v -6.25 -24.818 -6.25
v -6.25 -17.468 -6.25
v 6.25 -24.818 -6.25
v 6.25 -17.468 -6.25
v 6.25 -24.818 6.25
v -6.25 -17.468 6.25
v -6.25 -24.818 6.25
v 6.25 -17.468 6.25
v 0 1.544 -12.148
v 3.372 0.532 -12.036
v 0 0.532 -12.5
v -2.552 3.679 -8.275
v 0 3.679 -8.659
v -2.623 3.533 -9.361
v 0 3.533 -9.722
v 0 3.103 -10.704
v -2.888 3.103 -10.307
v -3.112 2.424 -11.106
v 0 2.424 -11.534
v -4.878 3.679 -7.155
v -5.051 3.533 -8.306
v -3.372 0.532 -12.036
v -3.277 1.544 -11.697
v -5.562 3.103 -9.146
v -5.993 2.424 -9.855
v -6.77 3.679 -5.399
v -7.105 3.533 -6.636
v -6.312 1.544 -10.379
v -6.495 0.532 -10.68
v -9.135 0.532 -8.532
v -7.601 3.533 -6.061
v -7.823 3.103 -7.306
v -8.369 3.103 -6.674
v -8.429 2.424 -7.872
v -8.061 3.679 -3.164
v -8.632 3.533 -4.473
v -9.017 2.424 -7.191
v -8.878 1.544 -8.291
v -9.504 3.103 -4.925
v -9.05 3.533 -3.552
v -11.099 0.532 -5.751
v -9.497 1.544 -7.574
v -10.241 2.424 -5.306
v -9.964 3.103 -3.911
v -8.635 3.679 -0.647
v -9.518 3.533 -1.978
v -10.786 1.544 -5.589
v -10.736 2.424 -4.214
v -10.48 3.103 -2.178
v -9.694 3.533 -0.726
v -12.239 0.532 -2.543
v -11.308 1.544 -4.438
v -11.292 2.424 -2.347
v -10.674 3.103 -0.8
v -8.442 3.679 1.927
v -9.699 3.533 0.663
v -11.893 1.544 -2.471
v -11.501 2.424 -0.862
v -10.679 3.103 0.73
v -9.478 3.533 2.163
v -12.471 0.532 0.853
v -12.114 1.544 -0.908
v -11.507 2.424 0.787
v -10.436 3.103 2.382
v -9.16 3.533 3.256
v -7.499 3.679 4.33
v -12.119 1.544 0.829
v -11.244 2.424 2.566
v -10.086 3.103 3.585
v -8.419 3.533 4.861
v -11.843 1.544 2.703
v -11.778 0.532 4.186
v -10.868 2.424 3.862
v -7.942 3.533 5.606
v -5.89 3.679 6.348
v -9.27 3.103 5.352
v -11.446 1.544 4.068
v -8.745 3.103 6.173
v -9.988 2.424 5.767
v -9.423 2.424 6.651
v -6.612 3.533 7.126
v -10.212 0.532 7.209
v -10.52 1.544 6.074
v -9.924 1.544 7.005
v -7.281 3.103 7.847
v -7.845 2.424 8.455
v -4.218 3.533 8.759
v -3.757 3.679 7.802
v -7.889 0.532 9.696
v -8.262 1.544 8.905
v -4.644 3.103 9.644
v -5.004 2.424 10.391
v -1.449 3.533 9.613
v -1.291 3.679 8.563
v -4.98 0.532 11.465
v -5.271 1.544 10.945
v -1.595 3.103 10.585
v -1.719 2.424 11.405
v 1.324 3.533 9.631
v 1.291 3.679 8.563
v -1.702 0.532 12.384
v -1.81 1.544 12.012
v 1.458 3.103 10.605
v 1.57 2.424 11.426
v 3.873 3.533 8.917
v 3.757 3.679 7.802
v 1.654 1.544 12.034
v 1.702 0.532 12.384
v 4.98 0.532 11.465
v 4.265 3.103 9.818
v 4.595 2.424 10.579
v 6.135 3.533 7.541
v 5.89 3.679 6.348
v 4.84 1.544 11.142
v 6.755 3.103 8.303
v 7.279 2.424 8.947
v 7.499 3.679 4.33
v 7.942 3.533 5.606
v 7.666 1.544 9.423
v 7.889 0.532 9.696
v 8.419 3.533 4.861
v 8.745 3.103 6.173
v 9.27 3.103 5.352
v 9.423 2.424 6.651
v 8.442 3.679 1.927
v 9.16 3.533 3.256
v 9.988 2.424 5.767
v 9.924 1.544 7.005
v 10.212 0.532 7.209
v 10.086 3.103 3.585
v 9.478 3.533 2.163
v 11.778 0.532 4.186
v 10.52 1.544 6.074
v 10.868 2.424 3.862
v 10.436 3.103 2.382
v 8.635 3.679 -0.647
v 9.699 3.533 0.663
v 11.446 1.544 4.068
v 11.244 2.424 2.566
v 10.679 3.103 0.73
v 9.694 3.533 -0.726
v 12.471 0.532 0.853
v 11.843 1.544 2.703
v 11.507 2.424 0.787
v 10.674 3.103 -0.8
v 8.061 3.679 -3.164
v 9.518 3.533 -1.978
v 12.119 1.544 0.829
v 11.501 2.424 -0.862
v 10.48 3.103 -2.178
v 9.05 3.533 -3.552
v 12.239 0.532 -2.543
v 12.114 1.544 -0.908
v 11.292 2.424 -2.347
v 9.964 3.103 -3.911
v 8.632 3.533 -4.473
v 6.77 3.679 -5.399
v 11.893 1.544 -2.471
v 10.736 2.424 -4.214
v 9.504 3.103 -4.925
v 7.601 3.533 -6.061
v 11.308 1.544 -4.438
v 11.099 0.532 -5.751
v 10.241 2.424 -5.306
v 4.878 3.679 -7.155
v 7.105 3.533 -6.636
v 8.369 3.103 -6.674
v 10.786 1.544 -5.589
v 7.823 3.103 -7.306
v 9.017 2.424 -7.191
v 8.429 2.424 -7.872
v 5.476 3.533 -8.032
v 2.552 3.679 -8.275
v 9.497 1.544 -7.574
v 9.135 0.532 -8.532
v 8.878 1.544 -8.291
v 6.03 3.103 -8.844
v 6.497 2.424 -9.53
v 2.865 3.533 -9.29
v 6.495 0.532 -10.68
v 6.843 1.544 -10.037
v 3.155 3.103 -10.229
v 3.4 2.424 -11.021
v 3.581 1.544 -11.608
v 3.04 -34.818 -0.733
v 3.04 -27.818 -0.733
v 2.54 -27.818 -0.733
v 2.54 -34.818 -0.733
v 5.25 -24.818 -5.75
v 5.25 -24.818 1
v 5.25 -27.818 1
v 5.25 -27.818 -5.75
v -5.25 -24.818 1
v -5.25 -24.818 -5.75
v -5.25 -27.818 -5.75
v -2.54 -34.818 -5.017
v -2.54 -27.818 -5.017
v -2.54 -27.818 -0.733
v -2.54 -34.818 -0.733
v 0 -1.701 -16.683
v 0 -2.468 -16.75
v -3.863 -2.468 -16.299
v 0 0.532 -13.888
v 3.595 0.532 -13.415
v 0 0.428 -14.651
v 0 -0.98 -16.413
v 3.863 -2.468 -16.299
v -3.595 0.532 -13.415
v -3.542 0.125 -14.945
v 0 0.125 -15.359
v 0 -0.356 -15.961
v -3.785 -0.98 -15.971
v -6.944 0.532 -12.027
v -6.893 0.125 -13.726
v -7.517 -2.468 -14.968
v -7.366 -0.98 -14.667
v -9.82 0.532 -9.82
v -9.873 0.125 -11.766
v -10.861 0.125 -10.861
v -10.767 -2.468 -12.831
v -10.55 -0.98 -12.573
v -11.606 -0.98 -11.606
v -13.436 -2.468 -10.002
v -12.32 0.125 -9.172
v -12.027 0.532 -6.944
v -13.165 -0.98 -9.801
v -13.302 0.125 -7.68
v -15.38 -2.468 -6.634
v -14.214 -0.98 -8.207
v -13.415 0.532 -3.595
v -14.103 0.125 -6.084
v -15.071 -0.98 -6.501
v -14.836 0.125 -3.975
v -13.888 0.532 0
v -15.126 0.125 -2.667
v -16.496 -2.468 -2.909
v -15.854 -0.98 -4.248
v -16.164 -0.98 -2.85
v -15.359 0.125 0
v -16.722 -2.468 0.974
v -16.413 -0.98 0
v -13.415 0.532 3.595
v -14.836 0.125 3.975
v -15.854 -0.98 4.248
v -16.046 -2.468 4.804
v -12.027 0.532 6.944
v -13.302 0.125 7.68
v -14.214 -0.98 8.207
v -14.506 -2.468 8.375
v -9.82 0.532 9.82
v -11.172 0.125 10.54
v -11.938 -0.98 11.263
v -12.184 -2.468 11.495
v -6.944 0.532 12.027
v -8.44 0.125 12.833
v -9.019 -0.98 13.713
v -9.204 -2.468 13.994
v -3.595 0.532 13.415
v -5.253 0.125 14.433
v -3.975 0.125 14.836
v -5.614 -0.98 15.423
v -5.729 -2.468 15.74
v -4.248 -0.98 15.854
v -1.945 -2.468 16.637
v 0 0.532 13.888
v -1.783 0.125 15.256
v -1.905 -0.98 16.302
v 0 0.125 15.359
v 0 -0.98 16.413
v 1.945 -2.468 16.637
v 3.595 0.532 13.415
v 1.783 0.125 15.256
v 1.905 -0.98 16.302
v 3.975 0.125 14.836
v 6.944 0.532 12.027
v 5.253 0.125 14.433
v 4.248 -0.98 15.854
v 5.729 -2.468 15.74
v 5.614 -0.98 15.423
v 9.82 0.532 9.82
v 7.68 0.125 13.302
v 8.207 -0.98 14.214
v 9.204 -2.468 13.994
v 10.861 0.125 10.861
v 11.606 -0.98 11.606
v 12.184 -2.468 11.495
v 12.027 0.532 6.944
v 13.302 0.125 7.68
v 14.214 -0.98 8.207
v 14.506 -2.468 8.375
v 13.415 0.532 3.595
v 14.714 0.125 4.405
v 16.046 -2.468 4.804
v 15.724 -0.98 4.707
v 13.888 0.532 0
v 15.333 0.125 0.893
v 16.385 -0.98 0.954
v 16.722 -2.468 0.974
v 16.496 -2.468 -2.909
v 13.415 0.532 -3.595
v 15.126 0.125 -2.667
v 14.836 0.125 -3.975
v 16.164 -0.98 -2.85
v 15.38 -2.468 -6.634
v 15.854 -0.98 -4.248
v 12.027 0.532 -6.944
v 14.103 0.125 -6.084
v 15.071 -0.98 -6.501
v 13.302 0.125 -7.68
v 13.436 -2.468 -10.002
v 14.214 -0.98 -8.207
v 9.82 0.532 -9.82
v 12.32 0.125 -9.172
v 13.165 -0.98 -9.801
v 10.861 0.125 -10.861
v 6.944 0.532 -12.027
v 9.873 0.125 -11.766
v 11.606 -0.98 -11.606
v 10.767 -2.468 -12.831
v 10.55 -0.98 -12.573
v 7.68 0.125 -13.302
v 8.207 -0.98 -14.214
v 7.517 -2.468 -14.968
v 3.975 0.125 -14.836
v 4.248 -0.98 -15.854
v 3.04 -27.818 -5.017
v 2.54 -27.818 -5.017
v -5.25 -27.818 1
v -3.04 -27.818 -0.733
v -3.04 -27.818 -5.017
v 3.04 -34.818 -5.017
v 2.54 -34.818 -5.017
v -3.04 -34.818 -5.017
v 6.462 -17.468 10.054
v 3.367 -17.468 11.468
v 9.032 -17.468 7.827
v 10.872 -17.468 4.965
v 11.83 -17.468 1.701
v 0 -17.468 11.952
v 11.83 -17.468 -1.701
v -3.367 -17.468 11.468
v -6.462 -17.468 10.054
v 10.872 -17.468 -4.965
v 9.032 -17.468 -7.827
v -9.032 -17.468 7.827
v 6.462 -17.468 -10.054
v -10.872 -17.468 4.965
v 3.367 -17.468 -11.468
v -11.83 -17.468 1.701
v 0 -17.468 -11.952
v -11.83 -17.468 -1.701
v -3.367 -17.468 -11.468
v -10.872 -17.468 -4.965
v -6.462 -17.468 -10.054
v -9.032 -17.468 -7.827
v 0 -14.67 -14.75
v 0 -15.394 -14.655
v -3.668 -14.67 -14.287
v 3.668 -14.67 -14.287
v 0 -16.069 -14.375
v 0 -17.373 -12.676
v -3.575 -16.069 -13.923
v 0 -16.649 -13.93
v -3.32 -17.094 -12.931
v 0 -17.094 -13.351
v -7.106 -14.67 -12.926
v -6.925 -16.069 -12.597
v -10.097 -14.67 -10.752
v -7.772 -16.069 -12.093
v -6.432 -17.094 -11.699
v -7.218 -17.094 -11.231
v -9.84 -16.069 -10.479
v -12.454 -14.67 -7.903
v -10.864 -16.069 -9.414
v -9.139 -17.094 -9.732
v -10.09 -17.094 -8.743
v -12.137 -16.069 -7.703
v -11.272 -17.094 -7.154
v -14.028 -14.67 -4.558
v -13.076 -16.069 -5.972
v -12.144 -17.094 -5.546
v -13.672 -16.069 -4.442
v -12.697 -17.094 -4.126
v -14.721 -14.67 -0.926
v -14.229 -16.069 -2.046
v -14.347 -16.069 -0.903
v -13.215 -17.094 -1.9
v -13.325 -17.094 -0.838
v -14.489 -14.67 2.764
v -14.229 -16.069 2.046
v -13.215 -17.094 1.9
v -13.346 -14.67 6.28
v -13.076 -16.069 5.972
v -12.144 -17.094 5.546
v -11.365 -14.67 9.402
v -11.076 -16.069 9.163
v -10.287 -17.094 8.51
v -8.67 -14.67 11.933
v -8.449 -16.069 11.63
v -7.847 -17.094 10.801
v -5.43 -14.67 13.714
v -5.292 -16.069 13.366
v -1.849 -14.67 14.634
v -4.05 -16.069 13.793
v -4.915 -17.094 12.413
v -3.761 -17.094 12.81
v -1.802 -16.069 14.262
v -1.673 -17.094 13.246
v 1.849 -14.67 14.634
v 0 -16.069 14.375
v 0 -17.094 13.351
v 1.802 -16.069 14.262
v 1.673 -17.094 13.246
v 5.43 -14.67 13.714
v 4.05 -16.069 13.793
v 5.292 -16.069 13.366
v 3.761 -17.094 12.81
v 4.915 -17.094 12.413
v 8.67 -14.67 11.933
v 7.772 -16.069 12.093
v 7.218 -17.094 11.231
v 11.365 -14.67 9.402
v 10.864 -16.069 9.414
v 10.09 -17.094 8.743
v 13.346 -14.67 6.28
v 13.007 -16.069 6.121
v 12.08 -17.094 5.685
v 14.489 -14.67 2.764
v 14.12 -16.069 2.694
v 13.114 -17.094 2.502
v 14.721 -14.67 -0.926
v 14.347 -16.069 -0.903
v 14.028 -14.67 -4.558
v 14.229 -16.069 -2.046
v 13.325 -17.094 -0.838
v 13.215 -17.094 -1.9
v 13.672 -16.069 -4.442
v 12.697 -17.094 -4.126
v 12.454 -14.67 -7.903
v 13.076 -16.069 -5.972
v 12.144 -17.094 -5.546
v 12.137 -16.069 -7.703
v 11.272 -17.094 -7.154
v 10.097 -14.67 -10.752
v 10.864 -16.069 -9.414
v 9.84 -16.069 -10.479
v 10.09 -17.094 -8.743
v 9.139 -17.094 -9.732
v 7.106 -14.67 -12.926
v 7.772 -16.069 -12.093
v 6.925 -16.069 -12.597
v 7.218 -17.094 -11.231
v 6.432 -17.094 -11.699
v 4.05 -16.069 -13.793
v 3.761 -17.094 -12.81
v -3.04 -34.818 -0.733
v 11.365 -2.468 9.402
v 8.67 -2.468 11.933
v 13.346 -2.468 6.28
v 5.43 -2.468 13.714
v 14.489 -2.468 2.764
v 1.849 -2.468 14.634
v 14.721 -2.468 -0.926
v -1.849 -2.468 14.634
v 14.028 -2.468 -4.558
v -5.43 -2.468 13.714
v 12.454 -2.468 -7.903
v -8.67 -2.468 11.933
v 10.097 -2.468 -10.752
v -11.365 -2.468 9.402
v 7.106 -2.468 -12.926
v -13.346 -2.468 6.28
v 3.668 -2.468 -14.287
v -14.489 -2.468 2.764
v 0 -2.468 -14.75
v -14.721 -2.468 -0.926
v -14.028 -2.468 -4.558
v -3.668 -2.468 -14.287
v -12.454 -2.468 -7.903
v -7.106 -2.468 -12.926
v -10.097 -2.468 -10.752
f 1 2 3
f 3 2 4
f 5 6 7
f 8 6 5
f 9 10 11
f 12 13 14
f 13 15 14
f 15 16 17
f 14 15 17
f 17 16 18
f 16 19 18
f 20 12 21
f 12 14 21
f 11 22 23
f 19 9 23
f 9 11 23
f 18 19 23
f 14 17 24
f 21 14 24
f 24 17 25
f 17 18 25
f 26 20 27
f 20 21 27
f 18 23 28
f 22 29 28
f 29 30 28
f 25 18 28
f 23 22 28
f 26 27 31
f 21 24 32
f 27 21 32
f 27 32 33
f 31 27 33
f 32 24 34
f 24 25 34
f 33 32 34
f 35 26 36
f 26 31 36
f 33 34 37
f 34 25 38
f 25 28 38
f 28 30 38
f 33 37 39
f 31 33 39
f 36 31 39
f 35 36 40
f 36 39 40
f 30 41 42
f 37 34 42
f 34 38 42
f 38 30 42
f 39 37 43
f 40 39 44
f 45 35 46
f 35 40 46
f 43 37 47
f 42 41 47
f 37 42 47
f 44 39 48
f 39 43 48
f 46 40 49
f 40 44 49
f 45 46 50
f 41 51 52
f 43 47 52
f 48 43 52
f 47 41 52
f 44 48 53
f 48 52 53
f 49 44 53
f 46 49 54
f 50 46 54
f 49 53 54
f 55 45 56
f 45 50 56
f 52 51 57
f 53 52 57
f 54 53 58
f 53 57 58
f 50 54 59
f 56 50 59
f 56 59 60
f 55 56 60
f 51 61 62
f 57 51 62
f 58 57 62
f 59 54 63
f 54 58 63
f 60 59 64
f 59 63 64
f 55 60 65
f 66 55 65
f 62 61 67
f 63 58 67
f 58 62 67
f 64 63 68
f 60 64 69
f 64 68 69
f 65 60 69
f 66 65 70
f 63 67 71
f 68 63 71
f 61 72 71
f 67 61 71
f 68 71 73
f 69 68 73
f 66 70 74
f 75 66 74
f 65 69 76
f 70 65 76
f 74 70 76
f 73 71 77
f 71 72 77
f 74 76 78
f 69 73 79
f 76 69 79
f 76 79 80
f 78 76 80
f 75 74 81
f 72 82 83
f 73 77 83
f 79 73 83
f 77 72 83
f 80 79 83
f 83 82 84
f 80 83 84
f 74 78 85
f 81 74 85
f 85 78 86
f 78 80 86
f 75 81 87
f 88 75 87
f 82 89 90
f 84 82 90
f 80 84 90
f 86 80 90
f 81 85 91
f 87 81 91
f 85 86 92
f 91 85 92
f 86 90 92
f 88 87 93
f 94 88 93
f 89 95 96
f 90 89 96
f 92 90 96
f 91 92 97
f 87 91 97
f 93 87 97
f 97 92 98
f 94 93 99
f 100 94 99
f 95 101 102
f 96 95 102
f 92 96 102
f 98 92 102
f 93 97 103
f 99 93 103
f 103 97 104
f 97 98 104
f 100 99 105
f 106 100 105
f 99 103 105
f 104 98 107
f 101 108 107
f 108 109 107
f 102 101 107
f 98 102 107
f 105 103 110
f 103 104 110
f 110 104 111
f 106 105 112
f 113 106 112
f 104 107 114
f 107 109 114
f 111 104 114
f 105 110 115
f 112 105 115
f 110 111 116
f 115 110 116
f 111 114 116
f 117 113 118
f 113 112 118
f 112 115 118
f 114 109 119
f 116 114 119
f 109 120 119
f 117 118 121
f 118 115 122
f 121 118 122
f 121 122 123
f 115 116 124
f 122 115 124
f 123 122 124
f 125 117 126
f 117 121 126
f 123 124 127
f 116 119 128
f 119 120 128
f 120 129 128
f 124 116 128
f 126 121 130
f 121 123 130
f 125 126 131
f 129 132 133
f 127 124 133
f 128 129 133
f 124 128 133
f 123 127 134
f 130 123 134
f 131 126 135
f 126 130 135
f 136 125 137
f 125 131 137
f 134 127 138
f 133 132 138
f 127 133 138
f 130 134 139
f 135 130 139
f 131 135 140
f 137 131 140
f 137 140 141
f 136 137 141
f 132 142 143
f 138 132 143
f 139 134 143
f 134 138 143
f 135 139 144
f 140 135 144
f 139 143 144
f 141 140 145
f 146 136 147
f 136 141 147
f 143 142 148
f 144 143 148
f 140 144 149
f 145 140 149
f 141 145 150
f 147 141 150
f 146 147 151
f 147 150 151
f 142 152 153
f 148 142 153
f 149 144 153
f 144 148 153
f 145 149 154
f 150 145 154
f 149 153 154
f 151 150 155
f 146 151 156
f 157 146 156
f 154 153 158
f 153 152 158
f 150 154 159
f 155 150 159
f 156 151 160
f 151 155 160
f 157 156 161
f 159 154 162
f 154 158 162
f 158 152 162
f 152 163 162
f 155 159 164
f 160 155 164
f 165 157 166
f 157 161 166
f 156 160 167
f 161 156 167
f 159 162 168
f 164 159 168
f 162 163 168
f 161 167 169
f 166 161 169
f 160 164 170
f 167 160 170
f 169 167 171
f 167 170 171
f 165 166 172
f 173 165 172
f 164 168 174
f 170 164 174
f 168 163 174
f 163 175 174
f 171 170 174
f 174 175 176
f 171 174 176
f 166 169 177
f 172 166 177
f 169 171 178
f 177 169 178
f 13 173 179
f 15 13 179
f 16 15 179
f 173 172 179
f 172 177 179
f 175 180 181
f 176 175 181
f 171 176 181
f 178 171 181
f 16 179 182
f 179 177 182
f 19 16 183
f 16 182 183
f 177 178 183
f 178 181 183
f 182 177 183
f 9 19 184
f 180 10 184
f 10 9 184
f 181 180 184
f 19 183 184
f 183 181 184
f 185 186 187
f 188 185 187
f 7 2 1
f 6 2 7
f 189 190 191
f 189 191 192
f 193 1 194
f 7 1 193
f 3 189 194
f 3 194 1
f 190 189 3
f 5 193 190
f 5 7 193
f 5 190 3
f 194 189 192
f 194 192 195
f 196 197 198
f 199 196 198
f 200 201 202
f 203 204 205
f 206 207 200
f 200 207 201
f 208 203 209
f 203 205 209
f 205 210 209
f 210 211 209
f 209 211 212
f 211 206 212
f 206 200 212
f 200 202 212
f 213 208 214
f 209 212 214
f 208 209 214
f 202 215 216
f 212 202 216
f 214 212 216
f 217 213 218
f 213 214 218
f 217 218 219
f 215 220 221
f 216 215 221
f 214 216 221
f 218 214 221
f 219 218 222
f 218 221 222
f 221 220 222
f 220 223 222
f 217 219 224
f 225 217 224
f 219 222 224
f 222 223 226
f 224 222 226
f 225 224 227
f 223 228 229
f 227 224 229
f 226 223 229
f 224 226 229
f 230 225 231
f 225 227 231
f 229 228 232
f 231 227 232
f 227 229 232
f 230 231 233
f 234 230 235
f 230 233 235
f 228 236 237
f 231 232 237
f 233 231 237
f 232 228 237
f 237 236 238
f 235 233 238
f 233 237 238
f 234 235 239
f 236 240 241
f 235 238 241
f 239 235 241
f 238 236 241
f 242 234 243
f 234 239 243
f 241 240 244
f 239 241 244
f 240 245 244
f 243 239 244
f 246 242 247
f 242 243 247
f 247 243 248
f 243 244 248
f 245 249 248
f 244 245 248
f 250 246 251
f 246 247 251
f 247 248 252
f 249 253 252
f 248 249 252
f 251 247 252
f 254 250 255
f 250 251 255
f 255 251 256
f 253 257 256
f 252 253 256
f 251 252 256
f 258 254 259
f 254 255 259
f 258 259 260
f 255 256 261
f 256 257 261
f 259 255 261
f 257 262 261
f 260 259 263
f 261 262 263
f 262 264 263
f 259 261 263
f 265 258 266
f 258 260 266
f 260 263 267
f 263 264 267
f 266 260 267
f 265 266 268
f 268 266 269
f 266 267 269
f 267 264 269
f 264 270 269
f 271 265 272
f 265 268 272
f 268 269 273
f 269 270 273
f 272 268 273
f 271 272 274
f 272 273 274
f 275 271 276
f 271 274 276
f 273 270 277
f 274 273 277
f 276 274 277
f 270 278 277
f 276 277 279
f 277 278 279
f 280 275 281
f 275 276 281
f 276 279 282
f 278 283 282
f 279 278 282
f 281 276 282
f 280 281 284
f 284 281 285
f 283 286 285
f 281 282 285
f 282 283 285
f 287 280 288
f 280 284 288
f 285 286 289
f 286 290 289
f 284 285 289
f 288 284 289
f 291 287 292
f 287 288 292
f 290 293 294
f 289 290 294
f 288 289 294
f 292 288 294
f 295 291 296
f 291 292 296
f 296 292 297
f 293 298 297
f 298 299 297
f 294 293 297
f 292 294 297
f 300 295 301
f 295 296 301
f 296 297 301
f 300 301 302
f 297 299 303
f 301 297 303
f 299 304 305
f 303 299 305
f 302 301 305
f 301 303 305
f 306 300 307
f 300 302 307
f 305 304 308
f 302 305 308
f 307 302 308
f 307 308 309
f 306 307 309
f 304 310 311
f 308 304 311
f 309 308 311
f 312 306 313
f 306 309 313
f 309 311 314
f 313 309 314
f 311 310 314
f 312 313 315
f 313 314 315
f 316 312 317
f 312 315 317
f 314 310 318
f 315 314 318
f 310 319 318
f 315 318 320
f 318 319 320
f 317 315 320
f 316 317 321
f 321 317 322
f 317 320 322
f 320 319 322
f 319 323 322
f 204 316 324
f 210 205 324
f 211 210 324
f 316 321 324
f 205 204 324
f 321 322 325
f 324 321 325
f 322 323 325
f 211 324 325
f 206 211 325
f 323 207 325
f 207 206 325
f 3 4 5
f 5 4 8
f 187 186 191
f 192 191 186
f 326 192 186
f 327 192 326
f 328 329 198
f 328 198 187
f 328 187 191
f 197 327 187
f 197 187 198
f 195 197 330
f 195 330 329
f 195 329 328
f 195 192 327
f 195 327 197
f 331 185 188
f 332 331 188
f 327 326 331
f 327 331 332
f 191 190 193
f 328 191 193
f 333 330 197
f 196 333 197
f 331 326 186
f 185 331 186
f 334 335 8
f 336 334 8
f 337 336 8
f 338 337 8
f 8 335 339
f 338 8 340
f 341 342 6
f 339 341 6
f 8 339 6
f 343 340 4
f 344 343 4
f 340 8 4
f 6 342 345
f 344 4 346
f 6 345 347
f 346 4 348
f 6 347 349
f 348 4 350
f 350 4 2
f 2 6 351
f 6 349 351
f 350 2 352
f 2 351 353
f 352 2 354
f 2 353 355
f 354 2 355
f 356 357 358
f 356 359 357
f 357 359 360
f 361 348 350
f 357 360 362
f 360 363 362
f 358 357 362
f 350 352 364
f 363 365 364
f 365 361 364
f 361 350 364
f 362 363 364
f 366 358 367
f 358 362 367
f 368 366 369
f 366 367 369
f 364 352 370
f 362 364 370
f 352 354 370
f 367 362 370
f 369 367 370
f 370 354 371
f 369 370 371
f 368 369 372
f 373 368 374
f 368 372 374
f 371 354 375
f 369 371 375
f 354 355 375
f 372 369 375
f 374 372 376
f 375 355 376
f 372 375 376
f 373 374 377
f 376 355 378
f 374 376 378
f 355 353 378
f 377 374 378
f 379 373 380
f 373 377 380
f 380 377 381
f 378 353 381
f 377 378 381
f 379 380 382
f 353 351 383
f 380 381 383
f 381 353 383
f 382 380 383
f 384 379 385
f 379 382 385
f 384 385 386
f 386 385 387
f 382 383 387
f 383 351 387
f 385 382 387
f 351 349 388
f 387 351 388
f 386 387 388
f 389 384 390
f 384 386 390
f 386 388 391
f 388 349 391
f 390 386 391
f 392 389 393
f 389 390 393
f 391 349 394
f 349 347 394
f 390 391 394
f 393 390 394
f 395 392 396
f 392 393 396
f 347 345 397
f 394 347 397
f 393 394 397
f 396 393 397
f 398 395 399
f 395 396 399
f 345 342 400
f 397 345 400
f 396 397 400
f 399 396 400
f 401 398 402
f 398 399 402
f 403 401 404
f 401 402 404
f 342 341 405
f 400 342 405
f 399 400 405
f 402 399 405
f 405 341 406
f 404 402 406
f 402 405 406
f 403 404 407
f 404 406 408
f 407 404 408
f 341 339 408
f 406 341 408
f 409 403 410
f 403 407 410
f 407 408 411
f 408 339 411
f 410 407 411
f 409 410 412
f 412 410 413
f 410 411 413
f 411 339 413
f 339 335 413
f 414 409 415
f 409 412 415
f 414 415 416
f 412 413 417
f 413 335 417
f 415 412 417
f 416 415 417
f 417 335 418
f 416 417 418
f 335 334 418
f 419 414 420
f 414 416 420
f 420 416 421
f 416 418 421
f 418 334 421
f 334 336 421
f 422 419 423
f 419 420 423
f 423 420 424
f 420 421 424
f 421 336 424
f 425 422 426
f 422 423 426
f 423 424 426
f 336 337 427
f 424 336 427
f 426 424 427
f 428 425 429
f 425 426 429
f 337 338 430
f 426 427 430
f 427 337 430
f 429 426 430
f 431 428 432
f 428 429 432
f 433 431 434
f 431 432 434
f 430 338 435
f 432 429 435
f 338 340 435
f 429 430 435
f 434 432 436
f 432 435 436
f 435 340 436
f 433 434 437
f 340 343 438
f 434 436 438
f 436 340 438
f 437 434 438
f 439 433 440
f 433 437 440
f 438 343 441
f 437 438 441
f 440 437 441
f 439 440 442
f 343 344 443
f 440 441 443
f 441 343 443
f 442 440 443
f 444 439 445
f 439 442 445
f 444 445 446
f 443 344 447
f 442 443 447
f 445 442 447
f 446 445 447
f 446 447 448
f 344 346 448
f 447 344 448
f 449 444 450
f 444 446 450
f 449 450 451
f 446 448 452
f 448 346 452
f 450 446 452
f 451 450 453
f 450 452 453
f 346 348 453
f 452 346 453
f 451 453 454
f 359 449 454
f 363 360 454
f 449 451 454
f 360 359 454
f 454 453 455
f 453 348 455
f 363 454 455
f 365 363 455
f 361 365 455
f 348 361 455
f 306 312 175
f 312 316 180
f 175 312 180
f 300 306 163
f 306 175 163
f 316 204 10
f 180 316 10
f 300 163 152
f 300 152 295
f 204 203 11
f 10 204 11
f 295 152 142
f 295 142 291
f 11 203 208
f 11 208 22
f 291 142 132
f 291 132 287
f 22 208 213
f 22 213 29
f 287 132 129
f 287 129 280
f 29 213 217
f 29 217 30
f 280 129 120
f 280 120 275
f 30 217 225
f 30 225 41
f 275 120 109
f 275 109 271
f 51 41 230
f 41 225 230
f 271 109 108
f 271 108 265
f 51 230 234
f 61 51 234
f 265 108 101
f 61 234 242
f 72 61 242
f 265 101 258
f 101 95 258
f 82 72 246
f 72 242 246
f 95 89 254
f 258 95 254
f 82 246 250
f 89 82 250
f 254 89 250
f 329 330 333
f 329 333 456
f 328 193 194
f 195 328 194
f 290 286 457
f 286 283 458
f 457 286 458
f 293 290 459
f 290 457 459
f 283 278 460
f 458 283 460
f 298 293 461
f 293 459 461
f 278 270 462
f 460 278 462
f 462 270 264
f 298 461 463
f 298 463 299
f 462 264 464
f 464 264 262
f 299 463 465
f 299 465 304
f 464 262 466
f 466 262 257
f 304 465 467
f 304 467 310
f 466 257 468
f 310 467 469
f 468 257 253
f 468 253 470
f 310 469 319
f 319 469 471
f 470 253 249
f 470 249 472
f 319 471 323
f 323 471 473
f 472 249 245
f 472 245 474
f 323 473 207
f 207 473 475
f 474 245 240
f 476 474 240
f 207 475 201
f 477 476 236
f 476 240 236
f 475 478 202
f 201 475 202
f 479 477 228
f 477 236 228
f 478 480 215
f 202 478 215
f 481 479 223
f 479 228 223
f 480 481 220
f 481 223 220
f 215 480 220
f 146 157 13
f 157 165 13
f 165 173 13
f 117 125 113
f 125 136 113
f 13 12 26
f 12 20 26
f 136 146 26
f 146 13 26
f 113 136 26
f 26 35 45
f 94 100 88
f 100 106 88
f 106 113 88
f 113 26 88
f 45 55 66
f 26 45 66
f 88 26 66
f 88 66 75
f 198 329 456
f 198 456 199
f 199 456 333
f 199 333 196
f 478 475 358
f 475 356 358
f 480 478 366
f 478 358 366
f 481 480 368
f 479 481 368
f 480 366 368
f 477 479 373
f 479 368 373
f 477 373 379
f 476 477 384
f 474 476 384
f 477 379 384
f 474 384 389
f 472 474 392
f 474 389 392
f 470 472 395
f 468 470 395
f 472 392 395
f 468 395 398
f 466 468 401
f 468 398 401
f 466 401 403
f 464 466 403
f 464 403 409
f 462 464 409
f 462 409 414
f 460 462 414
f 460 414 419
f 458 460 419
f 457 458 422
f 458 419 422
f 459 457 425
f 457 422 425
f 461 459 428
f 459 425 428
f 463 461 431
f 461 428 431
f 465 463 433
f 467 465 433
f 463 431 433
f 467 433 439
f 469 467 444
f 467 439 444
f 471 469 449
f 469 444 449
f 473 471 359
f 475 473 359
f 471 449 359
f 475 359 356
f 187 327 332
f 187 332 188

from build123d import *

# Parameters (mm, degrees)
CROQUIS3_W              = 12.5
CROQUIS3_H              = 12.5
SALIENTE_EXTRUIR1_DEPTH = 7.35
CROQUIS4_W              = 10.5
CROQUIS4_H              = 6.75
SALIENTE_EXTRUIR2_DEPTH = 3
CROQUIS5_W              = 0.5
CROQUIS5_H              = 4.284238858
SALIENTE_EXTRUIR3_DEPTH = 7


with BuildPart() as part:
    # Croquis2 → Revolución1 (revolve)
    with BuildSketch(Plane.XY, mode=Mode.PRIVATE) as revoluci_n1_sk:
        with BuildLine():
            Line((0, 3.679432079), (-8.659361316, 3.679432079))
            ThreePointArc((-8.659361316, 3.679432079), (-11.14229204, 2.791903832), (-12.5, 0.531532079))
            Line((-12.5, 0.531532079), (-13.888119122, 0.531532079))
            ThreePointArc((-13.888119122, 0.531532079), (-15.961182203, -0.355908417), (-16.75, -2.468467921))
            Line((-16.75, -2.468467921), (-14.75, -2.468467921))
            Line((-14.75, -2.468467921), (-14.75, -14.670168674))
            ThreePointArc((-14.75, -14.670168674), (-13.930397127, -16.648865047), (-11.951700754, -17.468467921))
            Line((-11.951700754, -17.468467921), (0, -17.468467921))
            Line((0, -17.468467921), (0, 3.679432079))
        make_face()
    revolve(revoluci_n1_sk.sketch.rotate(Axis((0, 0, 0), (0, 1, 0)), 270), axis=Axis((0, 0, 0), (0, 1, 0)))

    # Croquis3 → Saliente-Extruir1 (add)
    with BuildSketch(Plane.XZ.offset(17.468467921)):
        Rectangle(CROQUIS3_W, CROQUIS3_H)
    extrude(amount=SALIENTE_EXTRUIR1_DEPTH)

    # Croquis4 → Saliente-Extruir2 (add)
    with BuildSketch(Plane(origin=(0, -24.818467921, 0), x_dir=(-1, 0, 0), z_dir=(0, -1, 0))):
        with Locations((0, 2.375)):
            Rectangle(CROQUIS4_W, CROQUIS4_H)
    extrude(amount=SALIENTE_EXTRUIR2_DEPTH)

    # Croquis5 → Saliente-Extruir3 (add)
    with BuildSketch(Plane.XZ.offset(27.818467921)):
        with Locations((-2.79, -2.875)):
            Rectangle(CROQUIS5_W, CROQUIS5_H)
    saliente_extruir3 = extrude(amount=SALIENTE_EXTRUIR3_DEPTH)

    # Simetría1: Saliente-Extruir3 across plane
    add(saliente_extruir3.mirror(Plane(origin=(0, 0, 0), x_dir=(0, 0, 1), z_dir=(1, 0, 0))))


solid = part.part
